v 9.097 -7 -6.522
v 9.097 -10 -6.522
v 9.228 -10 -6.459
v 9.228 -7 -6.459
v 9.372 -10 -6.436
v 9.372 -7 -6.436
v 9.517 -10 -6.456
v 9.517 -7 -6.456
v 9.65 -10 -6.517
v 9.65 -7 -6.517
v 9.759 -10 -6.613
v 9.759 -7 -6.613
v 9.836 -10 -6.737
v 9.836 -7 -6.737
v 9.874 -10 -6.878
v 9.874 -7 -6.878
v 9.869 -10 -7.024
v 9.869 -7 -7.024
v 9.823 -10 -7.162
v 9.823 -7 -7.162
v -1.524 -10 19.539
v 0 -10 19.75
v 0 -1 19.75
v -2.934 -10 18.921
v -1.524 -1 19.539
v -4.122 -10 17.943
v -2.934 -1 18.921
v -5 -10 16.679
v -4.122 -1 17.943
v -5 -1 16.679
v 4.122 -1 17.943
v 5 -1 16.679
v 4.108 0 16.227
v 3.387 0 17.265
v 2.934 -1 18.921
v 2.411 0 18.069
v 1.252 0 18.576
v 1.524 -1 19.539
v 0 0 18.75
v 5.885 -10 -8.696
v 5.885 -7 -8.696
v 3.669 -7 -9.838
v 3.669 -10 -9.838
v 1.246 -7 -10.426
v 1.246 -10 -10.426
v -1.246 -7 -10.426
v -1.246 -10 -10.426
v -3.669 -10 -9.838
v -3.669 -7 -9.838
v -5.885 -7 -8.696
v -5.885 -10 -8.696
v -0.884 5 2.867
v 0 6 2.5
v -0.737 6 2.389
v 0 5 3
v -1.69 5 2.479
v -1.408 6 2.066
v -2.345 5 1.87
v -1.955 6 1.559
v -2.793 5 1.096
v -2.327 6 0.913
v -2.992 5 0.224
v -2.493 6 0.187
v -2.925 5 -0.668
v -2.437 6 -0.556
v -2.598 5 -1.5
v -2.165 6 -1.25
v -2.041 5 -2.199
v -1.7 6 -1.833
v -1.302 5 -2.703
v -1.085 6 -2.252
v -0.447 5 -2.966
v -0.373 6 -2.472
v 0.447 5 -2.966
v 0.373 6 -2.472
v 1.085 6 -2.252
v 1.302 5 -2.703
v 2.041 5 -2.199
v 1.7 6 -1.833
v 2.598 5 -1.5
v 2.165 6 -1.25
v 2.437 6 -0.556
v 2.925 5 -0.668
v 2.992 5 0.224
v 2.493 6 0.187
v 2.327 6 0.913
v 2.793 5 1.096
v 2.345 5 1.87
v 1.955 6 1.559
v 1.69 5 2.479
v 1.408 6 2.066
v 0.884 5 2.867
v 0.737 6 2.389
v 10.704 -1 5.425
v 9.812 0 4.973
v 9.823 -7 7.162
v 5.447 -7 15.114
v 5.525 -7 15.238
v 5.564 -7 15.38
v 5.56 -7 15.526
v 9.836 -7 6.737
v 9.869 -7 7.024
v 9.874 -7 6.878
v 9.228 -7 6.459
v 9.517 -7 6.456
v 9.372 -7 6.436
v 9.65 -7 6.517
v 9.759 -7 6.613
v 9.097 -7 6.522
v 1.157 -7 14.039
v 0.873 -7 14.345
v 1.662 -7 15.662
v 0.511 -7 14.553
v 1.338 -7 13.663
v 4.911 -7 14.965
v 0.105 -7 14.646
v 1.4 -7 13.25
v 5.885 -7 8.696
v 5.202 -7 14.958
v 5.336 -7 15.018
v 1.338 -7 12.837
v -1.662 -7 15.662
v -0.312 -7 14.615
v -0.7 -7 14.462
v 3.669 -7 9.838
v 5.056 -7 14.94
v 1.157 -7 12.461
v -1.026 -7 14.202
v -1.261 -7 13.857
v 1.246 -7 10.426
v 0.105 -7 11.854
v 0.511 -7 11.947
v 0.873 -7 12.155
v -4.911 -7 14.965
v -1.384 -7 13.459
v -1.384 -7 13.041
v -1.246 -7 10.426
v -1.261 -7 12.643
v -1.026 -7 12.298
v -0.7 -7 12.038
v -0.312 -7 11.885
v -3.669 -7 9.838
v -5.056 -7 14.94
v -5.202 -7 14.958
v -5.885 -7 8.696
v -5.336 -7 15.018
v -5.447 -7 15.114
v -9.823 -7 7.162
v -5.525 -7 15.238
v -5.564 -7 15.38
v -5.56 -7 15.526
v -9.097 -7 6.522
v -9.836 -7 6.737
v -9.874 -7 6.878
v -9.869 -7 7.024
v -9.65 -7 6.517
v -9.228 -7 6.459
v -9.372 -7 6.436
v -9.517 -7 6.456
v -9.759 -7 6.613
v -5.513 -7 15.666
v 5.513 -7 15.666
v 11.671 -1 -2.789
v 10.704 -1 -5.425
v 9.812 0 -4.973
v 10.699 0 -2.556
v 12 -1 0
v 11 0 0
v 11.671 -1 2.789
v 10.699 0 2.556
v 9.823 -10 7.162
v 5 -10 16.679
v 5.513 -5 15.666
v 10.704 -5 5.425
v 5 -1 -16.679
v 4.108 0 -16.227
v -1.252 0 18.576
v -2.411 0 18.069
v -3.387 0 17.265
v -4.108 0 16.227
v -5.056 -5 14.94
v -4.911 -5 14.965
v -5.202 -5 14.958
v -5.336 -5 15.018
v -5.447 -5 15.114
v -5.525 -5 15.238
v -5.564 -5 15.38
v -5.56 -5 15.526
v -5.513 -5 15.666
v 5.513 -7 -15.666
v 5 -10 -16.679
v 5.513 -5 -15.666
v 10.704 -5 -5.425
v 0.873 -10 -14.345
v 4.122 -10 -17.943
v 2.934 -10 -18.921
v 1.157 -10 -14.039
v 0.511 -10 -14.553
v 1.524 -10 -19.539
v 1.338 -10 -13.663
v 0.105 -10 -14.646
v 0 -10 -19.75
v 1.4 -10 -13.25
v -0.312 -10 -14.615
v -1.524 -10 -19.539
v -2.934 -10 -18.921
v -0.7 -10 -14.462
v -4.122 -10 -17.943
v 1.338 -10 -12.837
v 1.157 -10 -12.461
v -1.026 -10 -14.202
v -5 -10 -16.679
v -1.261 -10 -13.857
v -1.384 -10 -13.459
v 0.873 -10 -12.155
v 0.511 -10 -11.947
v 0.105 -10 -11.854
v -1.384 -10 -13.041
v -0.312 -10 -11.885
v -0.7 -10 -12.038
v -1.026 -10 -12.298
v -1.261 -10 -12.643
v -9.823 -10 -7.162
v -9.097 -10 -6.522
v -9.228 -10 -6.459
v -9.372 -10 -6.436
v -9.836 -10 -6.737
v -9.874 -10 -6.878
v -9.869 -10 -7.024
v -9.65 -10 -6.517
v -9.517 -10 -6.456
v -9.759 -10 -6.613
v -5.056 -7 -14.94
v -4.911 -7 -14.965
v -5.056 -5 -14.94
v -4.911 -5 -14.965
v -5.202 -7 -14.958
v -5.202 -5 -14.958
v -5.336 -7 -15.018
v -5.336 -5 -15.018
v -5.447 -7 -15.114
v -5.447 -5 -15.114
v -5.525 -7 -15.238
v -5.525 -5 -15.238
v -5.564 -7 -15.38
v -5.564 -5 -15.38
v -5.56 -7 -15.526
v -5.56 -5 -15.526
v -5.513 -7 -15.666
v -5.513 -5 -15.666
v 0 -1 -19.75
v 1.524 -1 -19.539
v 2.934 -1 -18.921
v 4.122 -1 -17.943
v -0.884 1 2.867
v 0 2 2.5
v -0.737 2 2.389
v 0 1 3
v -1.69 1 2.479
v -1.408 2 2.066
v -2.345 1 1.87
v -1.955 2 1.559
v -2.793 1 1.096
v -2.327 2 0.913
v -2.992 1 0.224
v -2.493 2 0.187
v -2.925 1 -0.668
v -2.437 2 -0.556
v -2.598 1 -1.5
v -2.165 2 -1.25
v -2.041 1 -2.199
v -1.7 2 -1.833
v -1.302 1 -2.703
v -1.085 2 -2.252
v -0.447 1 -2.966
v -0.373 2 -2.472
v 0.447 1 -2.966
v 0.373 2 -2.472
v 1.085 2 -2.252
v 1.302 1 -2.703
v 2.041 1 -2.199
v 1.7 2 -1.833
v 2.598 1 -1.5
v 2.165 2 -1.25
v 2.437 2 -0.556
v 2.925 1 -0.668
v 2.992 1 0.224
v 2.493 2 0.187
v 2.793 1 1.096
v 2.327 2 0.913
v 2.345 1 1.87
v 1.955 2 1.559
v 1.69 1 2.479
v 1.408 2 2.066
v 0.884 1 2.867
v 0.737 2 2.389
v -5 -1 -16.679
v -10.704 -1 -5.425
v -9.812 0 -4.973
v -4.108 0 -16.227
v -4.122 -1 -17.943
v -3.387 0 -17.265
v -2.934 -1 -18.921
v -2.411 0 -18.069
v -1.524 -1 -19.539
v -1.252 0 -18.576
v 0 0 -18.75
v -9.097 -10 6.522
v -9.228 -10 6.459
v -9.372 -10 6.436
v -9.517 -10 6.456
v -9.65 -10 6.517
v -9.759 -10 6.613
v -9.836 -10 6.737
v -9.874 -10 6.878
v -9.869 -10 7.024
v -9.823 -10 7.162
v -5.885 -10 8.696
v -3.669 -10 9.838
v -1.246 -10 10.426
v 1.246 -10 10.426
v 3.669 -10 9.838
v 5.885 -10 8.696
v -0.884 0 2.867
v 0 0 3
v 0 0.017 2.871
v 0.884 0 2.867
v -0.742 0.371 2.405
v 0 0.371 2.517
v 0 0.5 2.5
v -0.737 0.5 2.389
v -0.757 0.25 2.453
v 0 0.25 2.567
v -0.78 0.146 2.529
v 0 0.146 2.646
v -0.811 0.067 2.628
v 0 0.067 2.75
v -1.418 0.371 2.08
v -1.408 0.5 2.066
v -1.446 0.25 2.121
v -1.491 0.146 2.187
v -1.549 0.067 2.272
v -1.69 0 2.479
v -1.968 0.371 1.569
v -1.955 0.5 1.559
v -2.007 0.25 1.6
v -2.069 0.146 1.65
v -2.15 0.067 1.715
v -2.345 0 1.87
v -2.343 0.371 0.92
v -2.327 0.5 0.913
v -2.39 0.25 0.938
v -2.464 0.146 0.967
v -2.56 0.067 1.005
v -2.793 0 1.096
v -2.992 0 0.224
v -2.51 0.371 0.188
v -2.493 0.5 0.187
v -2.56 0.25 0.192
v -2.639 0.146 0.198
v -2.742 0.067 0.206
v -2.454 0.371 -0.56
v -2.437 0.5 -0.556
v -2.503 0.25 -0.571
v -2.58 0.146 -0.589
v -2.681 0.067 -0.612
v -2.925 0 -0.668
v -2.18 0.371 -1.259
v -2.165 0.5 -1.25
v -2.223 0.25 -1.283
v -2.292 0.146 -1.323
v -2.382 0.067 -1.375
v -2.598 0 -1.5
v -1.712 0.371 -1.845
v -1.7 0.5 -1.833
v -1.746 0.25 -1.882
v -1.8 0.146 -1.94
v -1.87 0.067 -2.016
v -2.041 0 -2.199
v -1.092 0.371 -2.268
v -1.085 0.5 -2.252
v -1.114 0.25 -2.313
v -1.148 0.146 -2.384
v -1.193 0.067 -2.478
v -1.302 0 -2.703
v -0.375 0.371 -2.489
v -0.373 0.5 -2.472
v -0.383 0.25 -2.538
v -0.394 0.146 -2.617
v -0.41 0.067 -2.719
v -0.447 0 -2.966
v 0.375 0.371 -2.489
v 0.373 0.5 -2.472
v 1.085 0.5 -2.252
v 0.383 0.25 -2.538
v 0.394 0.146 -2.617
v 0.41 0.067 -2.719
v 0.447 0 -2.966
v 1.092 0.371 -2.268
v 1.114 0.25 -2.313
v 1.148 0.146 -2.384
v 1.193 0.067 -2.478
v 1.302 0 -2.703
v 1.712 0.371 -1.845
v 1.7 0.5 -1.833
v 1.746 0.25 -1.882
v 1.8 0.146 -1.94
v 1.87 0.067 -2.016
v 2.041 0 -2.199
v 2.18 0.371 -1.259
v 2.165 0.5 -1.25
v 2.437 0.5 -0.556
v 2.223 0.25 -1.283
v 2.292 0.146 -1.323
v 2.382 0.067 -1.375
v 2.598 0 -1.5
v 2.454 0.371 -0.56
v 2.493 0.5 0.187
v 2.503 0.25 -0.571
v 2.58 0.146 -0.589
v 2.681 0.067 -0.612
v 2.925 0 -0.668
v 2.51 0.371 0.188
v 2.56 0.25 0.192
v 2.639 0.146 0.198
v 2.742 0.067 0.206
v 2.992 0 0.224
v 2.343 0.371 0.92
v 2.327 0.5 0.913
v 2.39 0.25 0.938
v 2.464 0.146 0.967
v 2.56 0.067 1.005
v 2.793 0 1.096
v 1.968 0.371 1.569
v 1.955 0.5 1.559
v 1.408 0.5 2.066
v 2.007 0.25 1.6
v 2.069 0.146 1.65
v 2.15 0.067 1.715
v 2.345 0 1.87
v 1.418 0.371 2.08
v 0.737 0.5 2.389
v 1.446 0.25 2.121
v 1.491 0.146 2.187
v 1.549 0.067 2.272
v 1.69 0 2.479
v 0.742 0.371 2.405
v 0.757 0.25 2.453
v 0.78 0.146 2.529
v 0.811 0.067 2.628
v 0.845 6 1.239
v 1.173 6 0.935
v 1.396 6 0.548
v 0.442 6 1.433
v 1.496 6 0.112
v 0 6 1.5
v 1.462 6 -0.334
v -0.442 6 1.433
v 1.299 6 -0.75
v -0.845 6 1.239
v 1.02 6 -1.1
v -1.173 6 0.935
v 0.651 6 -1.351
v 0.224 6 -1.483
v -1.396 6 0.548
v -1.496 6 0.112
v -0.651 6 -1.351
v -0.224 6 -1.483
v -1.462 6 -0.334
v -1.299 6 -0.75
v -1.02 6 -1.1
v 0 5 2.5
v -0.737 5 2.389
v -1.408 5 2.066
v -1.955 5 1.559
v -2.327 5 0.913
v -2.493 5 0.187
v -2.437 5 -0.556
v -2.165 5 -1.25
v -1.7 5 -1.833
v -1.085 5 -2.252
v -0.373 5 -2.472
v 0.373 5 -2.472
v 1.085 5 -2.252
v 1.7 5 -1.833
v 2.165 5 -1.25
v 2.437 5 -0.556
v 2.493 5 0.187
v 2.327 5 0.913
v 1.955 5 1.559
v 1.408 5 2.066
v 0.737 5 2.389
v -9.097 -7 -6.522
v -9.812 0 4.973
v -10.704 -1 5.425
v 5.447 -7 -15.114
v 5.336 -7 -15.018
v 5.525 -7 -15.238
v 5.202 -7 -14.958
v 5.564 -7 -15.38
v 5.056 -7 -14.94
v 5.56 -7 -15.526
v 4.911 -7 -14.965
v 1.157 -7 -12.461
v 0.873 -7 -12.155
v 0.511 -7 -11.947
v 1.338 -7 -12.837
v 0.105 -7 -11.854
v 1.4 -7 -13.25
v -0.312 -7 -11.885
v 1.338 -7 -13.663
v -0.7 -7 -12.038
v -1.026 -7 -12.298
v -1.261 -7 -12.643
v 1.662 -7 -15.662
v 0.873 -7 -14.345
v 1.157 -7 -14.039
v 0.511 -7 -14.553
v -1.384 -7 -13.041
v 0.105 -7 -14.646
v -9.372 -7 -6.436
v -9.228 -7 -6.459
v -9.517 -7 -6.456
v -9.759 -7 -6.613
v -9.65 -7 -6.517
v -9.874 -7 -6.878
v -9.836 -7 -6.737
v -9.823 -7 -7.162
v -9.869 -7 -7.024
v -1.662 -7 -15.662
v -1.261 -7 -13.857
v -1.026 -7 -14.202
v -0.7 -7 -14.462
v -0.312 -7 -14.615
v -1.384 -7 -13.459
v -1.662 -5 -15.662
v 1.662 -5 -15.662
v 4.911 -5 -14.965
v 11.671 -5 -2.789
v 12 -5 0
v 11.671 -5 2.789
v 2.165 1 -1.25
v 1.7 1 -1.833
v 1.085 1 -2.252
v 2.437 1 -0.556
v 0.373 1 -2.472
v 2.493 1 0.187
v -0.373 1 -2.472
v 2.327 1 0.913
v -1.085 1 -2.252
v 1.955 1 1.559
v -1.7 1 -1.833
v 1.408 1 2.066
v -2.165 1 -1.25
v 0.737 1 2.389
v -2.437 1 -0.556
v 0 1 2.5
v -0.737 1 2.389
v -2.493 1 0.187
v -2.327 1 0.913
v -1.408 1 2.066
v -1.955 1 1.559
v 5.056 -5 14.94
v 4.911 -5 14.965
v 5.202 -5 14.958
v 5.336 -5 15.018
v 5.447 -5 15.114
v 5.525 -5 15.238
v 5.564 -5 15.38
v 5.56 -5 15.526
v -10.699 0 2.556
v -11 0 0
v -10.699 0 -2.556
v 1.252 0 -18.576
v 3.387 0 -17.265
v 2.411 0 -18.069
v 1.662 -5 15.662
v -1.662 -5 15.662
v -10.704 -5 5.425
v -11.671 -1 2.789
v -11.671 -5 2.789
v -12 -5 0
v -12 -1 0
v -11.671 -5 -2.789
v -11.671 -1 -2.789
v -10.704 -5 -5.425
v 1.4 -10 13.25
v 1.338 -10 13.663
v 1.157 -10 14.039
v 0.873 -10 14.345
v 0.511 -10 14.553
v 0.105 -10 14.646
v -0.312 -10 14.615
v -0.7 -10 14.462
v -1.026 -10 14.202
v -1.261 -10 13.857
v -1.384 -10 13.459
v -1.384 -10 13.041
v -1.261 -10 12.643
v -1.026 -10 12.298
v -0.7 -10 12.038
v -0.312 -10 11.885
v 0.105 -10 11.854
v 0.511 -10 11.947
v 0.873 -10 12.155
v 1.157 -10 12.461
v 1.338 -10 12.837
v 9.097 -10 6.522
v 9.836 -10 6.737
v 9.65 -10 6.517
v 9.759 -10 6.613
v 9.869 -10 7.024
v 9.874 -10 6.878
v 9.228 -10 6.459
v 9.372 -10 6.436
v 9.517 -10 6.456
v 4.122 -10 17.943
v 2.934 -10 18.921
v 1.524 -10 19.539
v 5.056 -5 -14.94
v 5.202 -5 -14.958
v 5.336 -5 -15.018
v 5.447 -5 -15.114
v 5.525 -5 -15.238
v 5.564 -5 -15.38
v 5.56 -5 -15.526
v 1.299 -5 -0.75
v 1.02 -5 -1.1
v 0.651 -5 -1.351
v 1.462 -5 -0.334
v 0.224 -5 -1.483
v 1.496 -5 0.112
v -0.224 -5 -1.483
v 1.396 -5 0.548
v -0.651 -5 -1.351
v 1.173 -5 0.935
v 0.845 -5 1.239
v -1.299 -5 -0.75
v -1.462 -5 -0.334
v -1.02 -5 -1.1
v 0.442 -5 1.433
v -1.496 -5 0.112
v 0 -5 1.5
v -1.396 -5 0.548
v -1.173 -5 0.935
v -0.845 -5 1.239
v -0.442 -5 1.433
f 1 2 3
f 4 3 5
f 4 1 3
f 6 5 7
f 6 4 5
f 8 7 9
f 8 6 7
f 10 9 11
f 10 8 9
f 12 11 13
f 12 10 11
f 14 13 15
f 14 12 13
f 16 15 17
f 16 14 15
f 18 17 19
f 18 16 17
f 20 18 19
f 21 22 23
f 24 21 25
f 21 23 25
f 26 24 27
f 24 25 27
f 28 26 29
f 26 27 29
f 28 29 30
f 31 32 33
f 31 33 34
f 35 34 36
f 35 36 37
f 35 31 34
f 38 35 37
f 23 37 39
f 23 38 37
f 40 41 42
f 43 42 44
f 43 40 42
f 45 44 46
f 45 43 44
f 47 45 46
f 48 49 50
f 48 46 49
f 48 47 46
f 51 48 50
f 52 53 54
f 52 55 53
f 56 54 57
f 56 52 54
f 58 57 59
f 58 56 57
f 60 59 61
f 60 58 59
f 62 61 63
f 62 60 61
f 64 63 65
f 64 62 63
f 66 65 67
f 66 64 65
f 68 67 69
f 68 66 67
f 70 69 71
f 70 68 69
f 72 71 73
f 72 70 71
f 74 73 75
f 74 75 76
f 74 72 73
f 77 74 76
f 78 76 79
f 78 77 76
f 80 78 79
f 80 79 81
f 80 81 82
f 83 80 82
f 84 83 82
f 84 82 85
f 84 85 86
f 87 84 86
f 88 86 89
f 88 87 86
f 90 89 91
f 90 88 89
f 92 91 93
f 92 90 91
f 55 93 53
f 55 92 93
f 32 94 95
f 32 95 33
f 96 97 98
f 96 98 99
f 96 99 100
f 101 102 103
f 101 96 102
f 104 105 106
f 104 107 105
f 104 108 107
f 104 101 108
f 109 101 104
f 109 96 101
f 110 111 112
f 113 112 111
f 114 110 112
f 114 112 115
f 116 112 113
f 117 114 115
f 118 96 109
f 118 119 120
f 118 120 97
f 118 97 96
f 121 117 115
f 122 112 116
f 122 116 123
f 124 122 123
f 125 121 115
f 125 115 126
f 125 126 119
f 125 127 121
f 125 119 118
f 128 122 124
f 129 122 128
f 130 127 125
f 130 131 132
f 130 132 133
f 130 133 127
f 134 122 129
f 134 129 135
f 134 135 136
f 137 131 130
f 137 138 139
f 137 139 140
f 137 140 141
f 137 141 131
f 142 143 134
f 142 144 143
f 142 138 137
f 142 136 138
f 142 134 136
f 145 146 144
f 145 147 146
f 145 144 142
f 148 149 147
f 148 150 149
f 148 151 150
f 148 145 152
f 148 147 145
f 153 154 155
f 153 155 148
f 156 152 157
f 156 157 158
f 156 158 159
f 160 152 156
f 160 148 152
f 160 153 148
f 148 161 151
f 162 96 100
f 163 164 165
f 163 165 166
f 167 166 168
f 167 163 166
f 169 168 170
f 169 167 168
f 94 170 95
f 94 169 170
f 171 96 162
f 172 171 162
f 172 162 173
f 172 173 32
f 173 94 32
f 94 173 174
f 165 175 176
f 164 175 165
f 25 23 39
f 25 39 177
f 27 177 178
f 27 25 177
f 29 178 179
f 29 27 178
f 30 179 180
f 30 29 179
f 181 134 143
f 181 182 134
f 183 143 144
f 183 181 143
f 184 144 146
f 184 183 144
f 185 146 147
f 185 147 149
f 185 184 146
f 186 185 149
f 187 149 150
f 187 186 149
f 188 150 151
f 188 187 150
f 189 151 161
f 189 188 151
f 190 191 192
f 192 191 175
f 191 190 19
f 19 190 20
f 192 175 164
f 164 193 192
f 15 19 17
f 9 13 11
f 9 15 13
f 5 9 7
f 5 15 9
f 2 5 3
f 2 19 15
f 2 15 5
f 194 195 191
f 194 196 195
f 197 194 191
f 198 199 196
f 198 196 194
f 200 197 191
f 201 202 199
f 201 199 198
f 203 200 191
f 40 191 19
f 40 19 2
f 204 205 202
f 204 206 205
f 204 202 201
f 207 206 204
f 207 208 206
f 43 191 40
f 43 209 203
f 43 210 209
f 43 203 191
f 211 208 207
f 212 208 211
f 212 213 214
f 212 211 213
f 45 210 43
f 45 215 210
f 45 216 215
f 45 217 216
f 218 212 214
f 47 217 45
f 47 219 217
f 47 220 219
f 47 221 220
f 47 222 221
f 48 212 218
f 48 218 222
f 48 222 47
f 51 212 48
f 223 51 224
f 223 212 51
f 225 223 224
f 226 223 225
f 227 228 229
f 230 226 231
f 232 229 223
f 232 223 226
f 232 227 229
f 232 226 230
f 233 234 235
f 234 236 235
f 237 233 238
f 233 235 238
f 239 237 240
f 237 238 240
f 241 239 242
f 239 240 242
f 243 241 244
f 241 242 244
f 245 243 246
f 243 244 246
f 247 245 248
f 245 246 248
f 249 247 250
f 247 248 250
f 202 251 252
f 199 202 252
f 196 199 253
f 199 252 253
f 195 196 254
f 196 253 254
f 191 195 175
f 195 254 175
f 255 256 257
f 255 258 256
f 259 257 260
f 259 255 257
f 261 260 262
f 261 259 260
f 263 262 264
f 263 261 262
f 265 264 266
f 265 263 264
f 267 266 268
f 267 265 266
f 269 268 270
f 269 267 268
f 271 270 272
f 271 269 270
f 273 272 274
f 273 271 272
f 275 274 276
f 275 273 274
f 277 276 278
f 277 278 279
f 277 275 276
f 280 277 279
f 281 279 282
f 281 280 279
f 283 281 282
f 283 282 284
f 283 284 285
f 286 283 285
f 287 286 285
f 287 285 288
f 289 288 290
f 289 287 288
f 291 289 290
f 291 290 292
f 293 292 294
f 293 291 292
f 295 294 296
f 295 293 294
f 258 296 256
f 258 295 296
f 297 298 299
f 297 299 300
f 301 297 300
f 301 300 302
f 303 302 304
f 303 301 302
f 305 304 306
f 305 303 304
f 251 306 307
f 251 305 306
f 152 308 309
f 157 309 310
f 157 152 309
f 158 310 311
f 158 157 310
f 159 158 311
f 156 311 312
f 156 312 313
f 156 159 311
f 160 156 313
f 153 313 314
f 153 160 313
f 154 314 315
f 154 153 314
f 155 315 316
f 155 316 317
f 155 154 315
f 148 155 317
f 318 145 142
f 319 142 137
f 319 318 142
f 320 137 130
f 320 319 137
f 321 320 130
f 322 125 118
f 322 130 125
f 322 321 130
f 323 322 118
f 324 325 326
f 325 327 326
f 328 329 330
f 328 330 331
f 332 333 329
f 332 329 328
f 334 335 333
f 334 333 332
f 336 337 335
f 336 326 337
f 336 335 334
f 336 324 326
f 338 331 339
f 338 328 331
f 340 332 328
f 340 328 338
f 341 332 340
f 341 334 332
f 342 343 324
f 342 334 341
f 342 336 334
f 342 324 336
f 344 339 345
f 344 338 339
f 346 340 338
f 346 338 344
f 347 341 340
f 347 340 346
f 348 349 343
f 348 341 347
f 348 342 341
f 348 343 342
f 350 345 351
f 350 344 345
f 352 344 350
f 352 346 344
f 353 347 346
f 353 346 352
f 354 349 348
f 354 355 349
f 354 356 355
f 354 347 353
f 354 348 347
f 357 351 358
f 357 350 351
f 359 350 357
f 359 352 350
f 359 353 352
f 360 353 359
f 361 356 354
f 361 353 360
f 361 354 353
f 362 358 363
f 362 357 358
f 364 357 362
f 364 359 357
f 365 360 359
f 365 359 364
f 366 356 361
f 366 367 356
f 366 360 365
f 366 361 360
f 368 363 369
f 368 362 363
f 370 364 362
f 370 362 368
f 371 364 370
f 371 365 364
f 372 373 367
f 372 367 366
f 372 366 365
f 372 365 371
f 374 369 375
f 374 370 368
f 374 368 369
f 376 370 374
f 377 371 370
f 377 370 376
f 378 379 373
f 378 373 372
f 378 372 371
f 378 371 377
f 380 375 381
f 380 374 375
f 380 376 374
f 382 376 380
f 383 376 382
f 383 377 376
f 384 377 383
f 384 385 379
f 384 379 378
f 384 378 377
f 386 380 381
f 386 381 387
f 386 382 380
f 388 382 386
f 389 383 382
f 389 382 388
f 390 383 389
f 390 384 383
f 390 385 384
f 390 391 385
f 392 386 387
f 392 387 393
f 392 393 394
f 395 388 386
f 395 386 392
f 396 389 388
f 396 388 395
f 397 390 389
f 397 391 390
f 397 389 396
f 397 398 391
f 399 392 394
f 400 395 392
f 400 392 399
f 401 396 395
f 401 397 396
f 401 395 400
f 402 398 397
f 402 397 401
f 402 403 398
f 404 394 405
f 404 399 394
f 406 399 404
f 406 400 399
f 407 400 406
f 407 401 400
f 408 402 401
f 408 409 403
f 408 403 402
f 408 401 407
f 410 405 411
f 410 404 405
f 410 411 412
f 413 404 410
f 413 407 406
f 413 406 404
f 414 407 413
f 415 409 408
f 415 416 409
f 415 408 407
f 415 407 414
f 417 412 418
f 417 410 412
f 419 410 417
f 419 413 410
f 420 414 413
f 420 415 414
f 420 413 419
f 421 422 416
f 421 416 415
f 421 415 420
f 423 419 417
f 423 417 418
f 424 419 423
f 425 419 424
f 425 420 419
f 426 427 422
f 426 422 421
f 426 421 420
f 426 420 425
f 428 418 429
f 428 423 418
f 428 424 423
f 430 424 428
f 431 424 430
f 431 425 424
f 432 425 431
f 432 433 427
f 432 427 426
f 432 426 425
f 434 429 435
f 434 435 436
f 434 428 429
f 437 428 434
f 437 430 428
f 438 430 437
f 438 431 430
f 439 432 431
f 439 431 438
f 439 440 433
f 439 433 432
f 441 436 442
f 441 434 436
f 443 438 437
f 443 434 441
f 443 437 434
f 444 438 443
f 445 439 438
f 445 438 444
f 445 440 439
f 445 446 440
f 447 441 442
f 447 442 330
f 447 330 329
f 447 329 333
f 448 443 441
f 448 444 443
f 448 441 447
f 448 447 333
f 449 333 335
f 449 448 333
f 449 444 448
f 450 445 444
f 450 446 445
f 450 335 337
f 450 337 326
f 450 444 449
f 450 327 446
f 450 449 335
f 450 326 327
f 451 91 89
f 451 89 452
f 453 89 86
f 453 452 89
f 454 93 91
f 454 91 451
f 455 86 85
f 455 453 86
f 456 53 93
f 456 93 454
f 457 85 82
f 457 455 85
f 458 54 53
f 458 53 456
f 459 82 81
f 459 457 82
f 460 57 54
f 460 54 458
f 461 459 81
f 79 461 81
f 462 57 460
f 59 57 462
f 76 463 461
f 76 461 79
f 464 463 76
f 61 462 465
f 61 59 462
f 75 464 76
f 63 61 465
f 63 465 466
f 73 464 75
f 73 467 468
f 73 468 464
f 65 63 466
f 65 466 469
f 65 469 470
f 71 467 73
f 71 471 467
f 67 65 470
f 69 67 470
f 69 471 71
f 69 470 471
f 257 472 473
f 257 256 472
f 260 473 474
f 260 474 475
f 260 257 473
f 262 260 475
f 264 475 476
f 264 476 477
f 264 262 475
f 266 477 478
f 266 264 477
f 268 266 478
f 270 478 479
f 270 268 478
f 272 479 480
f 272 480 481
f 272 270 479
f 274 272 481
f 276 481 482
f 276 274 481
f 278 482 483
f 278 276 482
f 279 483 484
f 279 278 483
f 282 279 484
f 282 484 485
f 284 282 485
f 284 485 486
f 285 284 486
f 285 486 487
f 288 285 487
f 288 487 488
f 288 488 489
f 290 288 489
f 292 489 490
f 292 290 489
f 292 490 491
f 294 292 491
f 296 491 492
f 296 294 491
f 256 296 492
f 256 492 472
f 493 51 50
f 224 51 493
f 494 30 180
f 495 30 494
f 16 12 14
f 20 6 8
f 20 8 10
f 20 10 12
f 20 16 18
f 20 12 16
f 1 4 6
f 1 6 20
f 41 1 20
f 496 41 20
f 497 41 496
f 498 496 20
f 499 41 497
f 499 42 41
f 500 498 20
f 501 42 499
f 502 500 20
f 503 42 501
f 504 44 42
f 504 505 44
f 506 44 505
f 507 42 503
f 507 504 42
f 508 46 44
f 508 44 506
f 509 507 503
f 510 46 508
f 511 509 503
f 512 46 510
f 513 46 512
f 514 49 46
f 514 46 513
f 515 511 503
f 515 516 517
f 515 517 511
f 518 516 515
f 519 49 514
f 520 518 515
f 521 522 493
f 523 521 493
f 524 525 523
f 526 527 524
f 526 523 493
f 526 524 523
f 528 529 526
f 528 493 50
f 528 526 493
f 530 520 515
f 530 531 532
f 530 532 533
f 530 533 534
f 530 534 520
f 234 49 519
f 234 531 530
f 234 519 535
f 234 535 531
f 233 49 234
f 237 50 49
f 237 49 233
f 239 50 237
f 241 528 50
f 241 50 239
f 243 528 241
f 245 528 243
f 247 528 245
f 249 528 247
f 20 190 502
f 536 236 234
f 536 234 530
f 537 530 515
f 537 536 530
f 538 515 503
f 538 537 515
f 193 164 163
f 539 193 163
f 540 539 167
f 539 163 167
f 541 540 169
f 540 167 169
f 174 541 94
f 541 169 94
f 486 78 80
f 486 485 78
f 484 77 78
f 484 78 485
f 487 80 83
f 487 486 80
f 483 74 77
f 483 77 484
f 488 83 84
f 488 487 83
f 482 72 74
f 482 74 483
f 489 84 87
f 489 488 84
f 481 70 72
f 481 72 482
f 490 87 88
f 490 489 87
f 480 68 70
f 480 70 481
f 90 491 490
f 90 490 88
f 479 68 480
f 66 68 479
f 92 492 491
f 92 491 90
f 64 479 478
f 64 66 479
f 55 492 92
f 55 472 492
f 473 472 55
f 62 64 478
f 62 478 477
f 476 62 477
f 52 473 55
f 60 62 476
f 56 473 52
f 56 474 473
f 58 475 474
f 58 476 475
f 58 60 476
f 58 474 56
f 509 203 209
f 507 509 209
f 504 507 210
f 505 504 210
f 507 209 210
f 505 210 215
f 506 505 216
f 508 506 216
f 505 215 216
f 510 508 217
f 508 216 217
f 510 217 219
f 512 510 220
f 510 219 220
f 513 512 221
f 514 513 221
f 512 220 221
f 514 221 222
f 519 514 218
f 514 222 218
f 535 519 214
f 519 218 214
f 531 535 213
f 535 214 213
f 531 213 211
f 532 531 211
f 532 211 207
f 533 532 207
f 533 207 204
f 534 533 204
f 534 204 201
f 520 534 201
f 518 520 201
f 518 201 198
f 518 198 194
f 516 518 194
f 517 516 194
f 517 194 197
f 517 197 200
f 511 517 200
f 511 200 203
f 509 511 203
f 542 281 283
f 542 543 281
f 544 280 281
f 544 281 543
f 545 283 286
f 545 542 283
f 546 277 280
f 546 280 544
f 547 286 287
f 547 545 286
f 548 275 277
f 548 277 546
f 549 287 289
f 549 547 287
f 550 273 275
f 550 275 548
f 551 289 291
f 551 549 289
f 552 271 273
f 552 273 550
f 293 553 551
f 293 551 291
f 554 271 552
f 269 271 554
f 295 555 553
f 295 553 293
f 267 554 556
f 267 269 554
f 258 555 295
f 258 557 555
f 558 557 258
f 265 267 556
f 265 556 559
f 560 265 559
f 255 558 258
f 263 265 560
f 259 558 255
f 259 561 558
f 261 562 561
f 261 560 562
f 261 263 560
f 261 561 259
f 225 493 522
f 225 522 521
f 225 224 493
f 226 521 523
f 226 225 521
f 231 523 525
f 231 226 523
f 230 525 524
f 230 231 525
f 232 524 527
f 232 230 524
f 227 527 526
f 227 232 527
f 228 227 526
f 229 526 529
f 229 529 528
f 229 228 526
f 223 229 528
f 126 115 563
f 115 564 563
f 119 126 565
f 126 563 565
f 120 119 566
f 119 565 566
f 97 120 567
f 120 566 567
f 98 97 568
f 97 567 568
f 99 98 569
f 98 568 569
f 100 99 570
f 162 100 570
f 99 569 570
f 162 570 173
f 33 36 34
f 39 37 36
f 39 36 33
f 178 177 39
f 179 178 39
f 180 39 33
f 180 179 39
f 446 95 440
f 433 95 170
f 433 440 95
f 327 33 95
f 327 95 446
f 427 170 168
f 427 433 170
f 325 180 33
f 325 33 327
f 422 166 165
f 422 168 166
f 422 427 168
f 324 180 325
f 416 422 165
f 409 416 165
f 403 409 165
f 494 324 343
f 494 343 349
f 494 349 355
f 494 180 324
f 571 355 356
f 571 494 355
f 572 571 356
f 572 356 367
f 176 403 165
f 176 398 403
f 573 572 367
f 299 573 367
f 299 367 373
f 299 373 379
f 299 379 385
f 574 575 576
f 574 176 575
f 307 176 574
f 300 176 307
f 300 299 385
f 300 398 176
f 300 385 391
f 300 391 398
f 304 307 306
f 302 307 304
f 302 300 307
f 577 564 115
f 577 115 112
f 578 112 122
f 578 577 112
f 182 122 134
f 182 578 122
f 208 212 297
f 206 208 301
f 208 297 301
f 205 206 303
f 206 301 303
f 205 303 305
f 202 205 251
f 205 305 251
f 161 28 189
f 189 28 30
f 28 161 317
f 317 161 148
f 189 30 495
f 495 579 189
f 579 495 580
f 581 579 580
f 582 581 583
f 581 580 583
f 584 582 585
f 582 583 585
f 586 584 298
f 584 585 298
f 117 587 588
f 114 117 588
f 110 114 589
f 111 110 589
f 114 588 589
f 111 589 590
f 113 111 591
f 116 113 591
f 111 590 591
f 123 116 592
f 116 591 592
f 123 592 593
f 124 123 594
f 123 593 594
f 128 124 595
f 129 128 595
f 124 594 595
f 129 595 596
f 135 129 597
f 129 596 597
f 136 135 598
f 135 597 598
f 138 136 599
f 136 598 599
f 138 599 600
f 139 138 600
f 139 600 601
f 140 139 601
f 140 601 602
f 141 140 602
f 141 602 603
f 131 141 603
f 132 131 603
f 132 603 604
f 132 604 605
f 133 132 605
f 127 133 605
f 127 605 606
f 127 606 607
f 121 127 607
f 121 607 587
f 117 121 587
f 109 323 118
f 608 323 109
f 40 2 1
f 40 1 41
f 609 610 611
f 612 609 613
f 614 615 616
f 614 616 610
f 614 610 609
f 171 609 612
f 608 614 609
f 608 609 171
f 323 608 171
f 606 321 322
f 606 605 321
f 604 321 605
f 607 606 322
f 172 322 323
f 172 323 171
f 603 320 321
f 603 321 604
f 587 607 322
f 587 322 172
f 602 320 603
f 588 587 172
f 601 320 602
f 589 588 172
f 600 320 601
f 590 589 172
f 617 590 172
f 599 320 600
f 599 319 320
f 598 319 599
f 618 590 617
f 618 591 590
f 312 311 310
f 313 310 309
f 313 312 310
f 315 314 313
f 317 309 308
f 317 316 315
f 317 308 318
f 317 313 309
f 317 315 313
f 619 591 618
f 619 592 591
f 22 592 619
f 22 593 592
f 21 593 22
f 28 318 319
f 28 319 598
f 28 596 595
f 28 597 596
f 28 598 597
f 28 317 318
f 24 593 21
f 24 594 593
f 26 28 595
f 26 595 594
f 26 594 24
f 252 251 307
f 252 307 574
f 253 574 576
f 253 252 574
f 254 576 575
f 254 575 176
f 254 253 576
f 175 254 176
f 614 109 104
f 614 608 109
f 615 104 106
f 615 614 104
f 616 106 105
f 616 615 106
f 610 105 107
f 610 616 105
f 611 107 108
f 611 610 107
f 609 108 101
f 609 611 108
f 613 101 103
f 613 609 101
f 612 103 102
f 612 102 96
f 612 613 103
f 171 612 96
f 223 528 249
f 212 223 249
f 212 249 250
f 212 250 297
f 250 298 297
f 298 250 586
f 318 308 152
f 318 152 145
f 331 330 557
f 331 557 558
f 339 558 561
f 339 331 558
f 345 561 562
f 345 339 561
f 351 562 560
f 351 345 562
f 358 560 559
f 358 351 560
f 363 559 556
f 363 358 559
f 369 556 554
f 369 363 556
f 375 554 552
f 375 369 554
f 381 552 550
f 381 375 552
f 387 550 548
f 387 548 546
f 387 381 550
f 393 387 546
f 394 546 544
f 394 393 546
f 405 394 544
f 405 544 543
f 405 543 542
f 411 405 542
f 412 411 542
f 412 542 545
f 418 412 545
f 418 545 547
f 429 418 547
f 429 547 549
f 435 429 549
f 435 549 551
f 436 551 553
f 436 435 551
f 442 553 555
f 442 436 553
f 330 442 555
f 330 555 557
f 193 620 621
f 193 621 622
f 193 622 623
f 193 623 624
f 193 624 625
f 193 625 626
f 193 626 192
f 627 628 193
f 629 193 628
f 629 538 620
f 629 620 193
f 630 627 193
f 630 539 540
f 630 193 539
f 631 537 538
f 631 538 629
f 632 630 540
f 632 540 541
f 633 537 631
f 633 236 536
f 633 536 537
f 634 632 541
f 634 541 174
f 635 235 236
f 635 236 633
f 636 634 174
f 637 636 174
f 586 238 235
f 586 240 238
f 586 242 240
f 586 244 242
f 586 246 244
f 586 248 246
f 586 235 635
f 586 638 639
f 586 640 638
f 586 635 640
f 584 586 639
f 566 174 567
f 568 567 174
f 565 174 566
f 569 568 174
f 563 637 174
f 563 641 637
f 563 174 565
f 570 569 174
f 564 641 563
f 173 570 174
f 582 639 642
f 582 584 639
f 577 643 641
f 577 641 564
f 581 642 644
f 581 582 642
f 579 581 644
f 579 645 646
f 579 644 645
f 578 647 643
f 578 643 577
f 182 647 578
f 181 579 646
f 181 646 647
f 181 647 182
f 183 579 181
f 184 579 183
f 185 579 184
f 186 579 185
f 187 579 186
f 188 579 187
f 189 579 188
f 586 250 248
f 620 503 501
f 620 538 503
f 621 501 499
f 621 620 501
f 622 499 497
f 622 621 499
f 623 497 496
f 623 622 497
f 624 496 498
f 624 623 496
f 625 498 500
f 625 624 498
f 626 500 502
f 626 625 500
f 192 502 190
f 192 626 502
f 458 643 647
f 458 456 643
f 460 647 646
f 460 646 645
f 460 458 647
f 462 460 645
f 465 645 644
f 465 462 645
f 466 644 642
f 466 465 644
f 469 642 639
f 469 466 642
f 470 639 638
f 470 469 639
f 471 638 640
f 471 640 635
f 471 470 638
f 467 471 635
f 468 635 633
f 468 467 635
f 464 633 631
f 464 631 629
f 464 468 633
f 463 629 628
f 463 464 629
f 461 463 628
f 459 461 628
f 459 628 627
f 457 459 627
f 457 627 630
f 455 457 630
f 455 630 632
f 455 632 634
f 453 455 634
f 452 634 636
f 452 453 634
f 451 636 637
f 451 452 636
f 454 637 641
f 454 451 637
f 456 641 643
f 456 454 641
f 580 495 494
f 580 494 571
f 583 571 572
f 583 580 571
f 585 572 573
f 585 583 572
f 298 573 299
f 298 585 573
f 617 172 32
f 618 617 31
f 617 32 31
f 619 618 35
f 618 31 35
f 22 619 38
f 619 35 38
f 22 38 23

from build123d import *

# Parameters (mm, degrees)
CUT_EXTRUDE1_DEPTH = 11
CUT_EXTRUDE3_DEPTH = 5
FILLET1_R          = 0.5
FILLET3_R          = 0.5
CHAMFER2_SIZE      = 1
SKETCH12_R         = 1.4
CUT_EXTRUDE7_DEPTH = 5


with BuildPart() as part:
    # Sketch2 → Revolve1 (revolve)
    with BuildSketch(Plane(origin=(0, 0, 0), x_dir=(0, 0, -1), z_dir=(1, 0, 0))):
        Polygon((-2.5, 0), (-19.75, 0), (-19.75, -10), (-8.75, -10), (-8.75, -7), (-15.75, -7), (-15.75, -5), (-1.5, -5), (-1.5, 6), (-2.5, 6), (-3, 5), (-2.5, 5), (-2.5, 2), (-3, 1), (-2.5, 1), align=None)
    revolve(axis=Axis((0, 7.880012575, 0), (0, -1, 0)))

    # Sketch3 → Cut-Extrude1 (cut, through all)
    with BuildSketch(Plane(origin=(0, 0, 0), x_dir=(1, 0, 0), z_dir=(0, 1, 0))):
        with BuildLine():
            ThreePointArc((-10.703712775, -5.424991506), (-12, 0), (-10.703712775, 5.424991506))
            Line((-10.703712775, 5.424991506), (-5, 16.678631853))
            ThreePointArc((-5, 16.678631853), (-2.933994828, 18.920833005), (-3.1e-08, 19.75))
            ThreePointArc((-3.1e-08, 19.75), (-19.75, -1.6e-08), (0, -19.75))
            ThreePointArc((0, -19.75), (-2.933994815, -18.920833013), (-5, -16.678631853))
            Line((-5, -16.678631853), (-10.703712775, -5.424991506))
        make_face()
        with BuildLine():
            ThreePointArc((19.75, 0), (13.965358917, 13.965358939), (-3.1e-08, 19.75))
            ThreePointArc((-3.1e-08, 19.75), (2.933994802, 18.920833021), (5, 16.678631853))
            Line((5, 16.678631853), (10.703712775, 5.424991506))
            ThreePointArc((10.703712775, 5.424991506), (12, 0), (10.703712775, -5.424991506))
            Line((10.703712775, -5.424991506), (5, -16.678631853))
            ThreePointArc((5, -16.678631853), (2.933994815, -18.920833013), (0, -19.75))
            ThreePointArc((0, -19.75), (13.965358928, -13.965358928), (19.75, 0))
        make_face()
    extrude(amount=-CUT_EXTRUDE1_DEPTH, mode=Mode.SUBTRACT)

    # Sketch5 → Cut-Extrude3 (cut)
    with BuildSketch(Plane.XZ.offset(10)):
        with BuildLine():
            Line((-5.884741508, -8.695965581), (-11.34632201, -5))
            ThreePointArc((-11.34632201, -5), (-14, 0), (-11.34632201, 5))
            Line((-11.34632201, 5), (-5.884741508, 8.695965581))
            ThreePointArc((-5.884741508, 8.695965581), (0, 10.5), (5.884741508, 8.695965581))
            Line((5.884741508, 8.695965581), (11.34632201, 5))
            ThreePointArc((11.34632201, 5), (14, 0), (11.34632201, -5))
            Line((11.34632201, -5), (5.884741508, -8.695965581))
            ThreePointArc((5.884741508, -8.695965581), (0, -10.5), (-5.884741508, -8.695965581))
        make_face()
    extrude(amount=-CUT_EXTRUDE3_DEPTH, mode=Mode.SUBTRACT)

    # Fillet1
    fillet1_edges = [part.edges().sort_by_distance(p)[0] for p in [
        (-6.091971401, -6, -14.524131108),
        (-6.091971401, -6, 14.524131108),
        (6.091971401, -6, -14.524131108),
        (6.091971401, -6, 14.524131108),
        (10.696094588, -8.5, -5.440022476),
        (10.696094588, -8.5, 5.440022476),
        (-10.696094588, -8.5, 5.440022476),
        (-10.696094588, -8.5, -5.440022476),
    ]]
    fillet(fillet1_edges, radius=FILLET1_R)

    # Fillet3
    fillet3_edges = [part.edges().sort_by_distance(p)[0] for p in [
        (0, 0, -2.5),
    ]]
    fillet(fillet3_edges, radius=FILLET3_R)

    # Chamfer2
    chamfer2_edges = [part.edges().sort_by_distance(p)[0] for p in [
        (0, 0, 19.75),
        (-7.851856387, 0, 11.051811679),
        (-12, 0, 0),
        (-7.851856387, 0, -11.051811679),
        (0, 0, -19.75),
        (7.851856387, 0, 11.051811679),
        (7.851856387, 0, -11.051811679),
        (12, 0, 0),
    ]]
    chamfer(chamfer2_edges, length=CHAMFER2_SIZE)

    # Sketch12 → Cut-Extrude7 (cut)
    with BuildSketch(Plane.XZ.offset(10)):
        with Locations((0, -13.25)):
            Circle(SKETCH12_R)
        with Locations((0, 13.25)):
            Circle(SKETCH12_R)
    extrude(amount=-CUT_EXTRUDE7_DEPTH, mode=Mode.SUBTRACT)


solid = part.part
